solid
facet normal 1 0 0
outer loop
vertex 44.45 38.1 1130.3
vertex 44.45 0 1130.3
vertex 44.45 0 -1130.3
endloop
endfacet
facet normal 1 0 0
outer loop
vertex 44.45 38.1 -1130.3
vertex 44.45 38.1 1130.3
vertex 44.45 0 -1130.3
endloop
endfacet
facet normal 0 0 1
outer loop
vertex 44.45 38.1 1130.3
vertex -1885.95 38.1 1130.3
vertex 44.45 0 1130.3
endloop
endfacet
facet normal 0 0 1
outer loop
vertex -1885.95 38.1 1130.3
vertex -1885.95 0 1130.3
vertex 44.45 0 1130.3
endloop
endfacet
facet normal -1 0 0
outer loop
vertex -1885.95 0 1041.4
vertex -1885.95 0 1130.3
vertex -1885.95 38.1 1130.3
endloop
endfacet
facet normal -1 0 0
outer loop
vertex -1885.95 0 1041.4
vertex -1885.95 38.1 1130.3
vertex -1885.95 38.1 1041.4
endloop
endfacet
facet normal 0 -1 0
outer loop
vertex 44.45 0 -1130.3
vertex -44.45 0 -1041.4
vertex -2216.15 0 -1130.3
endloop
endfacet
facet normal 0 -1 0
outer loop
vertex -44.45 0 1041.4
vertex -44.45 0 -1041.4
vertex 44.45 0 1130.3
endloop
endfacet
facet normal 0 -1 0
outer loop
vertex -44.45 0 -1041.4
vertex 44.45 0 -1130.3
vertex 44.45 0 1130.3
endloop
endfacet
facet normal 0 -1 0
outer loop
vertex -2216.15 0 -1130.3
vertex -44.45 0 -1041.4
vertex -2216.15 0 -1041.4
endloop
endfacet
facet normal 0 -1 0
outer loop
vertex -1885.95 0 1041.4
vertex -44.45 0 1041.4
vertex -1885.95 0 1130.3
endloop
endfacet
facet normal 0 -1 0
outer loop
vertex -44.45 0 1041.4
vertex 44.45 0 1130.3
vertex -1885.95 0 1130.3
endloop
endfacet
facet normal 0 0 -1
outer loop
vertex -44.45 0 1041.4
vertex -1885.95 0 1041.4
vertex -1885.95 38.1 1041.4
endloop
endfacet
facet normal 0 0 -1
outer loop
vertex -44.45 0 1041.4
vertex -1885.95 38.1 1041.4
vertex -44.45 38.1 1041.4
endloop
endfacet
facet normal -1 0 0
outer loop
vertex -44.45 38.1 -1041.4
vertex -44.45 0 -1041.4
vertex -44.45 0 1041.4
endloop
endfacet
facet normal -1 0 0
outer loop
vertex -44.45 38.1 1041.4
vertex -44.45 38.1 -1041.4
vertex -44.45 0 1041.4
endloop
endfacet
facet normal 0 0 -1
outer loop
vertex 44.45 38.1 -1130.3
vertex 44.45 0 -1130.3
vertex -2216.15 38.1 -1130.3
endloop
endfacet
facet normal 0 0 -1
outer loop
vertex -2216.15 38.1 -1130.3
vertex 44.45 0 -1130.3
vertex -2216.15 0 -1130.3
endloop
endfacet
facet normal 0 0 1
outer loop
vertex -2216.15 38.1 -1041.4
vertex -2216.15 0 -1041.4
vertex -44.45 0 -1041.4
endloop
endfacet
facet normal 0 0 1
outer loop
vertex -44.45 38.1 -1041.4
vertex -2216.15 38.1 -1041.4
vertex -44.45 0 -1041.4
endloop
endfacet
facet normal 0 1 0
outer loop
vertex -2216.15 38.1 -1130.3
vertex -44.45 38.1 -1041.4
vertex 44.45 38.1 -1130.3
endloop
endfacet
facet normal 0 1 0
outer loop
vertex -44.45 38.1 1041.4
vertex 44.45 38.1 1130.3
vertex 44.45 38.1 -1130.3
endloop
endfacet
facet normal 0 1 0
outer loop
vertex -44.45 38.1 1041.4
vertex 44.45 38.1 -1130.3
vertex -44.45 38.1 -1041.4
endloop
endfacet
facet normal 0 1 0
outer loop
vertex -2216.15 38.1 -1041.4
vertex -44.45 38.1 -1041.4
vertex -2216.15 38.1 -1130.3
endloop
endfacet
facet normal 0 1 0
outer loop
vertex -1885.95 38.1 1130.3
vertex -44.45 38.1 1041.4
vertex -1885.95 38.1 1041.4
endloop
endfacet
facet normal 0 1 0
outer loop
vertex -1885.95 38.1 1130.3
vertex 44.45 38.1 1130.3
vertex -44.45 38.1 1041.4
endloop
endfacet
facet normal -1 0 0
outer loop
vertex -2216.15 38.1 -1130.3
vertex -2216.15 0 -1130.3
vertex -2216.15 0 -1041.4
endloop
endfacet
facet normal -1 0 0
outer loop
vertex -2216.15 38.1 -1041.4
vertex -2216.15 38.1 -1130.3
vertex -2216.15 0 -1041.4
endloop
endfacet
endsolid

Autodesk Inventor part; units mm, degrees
ref_plane "YZ Plane" through (0, 0, 0) normal (1, 0, 0) x (0, 1, 0)
ref_plane "XZ Plane" through (0, 0, 0) normal (0, 1, 0) x (-1, 0, 0)
ref_plane "XY Plane" through (0, 0, 0) normal (0, 0, 1) x (1, 0, 0)
sketch "Sketch1" plane through (0, 0, 0) normal (0, 1, 0) x (-1, 0, 0)
  line L0 (-44.45, 1130.3) -> (-44.45, -1130.3)
  line L1 (-44.45, -1130.3) -> (44.45, -1130.3)
  line L2 (44.45, -1041.4) -> (44.45, 1130.3)
  line L3 (44.45, 1130.3) -> (-44.45, 1130.3)
  line L4 (-44.45, 1130.3) -> (44.45, -1130.3) construction
  line L5 (-44.45, -1130.3) -> (44.45, 1130.3) construction
  line L6 (44.45, 1130.3) -> (1885.95, 1130.3)
  line L7 (1885.95, 1130.3) -> (1885.95, 1041.4)
  line L8 (1795.9397, 1041.4) -> (44.45, 1041.4)
  line L9 (44.45, 1041.4) -> (44.45, 1130.3)
  line L10 (44.45, -1130.3) -> (2216.15, -1130.3)
  line L11 (2216.15, -1130.3) -> (2216.15, -1041.4)
  line L12 (2126.1397, -1041.4) -> (44.45, -1041.4)
  line L13 (44.45, -1041.4) -> (44.45, -1130.3)
  line L14 (2128.3466, -1055.3201) -> (2126.1397, -1041.4) construction
  line L15 (1885.95, 1041.4) -> (1798.1466, 1027.4799) construction
  line L16 (2216.15, -1041.4) -> (2126.1397, -1041.4)
  line L17 (1885.95, 1041.4) -> (1795.9397, 1041.4)
  point P0 (0, 0)
  dimension "d0" = 88.9
  dimension "d1" = 2260.6
  dimension "d3" = 1930.4
  dimension "d5" = 2260.6
  dimension "d16" = 88.9
  dimension "d17" = 88.9
extrude "Extrusion1" add sketch "Sketch1" along normal blind 38.1
properties part number "Base for Pool House" material "Wood (Oak)"
